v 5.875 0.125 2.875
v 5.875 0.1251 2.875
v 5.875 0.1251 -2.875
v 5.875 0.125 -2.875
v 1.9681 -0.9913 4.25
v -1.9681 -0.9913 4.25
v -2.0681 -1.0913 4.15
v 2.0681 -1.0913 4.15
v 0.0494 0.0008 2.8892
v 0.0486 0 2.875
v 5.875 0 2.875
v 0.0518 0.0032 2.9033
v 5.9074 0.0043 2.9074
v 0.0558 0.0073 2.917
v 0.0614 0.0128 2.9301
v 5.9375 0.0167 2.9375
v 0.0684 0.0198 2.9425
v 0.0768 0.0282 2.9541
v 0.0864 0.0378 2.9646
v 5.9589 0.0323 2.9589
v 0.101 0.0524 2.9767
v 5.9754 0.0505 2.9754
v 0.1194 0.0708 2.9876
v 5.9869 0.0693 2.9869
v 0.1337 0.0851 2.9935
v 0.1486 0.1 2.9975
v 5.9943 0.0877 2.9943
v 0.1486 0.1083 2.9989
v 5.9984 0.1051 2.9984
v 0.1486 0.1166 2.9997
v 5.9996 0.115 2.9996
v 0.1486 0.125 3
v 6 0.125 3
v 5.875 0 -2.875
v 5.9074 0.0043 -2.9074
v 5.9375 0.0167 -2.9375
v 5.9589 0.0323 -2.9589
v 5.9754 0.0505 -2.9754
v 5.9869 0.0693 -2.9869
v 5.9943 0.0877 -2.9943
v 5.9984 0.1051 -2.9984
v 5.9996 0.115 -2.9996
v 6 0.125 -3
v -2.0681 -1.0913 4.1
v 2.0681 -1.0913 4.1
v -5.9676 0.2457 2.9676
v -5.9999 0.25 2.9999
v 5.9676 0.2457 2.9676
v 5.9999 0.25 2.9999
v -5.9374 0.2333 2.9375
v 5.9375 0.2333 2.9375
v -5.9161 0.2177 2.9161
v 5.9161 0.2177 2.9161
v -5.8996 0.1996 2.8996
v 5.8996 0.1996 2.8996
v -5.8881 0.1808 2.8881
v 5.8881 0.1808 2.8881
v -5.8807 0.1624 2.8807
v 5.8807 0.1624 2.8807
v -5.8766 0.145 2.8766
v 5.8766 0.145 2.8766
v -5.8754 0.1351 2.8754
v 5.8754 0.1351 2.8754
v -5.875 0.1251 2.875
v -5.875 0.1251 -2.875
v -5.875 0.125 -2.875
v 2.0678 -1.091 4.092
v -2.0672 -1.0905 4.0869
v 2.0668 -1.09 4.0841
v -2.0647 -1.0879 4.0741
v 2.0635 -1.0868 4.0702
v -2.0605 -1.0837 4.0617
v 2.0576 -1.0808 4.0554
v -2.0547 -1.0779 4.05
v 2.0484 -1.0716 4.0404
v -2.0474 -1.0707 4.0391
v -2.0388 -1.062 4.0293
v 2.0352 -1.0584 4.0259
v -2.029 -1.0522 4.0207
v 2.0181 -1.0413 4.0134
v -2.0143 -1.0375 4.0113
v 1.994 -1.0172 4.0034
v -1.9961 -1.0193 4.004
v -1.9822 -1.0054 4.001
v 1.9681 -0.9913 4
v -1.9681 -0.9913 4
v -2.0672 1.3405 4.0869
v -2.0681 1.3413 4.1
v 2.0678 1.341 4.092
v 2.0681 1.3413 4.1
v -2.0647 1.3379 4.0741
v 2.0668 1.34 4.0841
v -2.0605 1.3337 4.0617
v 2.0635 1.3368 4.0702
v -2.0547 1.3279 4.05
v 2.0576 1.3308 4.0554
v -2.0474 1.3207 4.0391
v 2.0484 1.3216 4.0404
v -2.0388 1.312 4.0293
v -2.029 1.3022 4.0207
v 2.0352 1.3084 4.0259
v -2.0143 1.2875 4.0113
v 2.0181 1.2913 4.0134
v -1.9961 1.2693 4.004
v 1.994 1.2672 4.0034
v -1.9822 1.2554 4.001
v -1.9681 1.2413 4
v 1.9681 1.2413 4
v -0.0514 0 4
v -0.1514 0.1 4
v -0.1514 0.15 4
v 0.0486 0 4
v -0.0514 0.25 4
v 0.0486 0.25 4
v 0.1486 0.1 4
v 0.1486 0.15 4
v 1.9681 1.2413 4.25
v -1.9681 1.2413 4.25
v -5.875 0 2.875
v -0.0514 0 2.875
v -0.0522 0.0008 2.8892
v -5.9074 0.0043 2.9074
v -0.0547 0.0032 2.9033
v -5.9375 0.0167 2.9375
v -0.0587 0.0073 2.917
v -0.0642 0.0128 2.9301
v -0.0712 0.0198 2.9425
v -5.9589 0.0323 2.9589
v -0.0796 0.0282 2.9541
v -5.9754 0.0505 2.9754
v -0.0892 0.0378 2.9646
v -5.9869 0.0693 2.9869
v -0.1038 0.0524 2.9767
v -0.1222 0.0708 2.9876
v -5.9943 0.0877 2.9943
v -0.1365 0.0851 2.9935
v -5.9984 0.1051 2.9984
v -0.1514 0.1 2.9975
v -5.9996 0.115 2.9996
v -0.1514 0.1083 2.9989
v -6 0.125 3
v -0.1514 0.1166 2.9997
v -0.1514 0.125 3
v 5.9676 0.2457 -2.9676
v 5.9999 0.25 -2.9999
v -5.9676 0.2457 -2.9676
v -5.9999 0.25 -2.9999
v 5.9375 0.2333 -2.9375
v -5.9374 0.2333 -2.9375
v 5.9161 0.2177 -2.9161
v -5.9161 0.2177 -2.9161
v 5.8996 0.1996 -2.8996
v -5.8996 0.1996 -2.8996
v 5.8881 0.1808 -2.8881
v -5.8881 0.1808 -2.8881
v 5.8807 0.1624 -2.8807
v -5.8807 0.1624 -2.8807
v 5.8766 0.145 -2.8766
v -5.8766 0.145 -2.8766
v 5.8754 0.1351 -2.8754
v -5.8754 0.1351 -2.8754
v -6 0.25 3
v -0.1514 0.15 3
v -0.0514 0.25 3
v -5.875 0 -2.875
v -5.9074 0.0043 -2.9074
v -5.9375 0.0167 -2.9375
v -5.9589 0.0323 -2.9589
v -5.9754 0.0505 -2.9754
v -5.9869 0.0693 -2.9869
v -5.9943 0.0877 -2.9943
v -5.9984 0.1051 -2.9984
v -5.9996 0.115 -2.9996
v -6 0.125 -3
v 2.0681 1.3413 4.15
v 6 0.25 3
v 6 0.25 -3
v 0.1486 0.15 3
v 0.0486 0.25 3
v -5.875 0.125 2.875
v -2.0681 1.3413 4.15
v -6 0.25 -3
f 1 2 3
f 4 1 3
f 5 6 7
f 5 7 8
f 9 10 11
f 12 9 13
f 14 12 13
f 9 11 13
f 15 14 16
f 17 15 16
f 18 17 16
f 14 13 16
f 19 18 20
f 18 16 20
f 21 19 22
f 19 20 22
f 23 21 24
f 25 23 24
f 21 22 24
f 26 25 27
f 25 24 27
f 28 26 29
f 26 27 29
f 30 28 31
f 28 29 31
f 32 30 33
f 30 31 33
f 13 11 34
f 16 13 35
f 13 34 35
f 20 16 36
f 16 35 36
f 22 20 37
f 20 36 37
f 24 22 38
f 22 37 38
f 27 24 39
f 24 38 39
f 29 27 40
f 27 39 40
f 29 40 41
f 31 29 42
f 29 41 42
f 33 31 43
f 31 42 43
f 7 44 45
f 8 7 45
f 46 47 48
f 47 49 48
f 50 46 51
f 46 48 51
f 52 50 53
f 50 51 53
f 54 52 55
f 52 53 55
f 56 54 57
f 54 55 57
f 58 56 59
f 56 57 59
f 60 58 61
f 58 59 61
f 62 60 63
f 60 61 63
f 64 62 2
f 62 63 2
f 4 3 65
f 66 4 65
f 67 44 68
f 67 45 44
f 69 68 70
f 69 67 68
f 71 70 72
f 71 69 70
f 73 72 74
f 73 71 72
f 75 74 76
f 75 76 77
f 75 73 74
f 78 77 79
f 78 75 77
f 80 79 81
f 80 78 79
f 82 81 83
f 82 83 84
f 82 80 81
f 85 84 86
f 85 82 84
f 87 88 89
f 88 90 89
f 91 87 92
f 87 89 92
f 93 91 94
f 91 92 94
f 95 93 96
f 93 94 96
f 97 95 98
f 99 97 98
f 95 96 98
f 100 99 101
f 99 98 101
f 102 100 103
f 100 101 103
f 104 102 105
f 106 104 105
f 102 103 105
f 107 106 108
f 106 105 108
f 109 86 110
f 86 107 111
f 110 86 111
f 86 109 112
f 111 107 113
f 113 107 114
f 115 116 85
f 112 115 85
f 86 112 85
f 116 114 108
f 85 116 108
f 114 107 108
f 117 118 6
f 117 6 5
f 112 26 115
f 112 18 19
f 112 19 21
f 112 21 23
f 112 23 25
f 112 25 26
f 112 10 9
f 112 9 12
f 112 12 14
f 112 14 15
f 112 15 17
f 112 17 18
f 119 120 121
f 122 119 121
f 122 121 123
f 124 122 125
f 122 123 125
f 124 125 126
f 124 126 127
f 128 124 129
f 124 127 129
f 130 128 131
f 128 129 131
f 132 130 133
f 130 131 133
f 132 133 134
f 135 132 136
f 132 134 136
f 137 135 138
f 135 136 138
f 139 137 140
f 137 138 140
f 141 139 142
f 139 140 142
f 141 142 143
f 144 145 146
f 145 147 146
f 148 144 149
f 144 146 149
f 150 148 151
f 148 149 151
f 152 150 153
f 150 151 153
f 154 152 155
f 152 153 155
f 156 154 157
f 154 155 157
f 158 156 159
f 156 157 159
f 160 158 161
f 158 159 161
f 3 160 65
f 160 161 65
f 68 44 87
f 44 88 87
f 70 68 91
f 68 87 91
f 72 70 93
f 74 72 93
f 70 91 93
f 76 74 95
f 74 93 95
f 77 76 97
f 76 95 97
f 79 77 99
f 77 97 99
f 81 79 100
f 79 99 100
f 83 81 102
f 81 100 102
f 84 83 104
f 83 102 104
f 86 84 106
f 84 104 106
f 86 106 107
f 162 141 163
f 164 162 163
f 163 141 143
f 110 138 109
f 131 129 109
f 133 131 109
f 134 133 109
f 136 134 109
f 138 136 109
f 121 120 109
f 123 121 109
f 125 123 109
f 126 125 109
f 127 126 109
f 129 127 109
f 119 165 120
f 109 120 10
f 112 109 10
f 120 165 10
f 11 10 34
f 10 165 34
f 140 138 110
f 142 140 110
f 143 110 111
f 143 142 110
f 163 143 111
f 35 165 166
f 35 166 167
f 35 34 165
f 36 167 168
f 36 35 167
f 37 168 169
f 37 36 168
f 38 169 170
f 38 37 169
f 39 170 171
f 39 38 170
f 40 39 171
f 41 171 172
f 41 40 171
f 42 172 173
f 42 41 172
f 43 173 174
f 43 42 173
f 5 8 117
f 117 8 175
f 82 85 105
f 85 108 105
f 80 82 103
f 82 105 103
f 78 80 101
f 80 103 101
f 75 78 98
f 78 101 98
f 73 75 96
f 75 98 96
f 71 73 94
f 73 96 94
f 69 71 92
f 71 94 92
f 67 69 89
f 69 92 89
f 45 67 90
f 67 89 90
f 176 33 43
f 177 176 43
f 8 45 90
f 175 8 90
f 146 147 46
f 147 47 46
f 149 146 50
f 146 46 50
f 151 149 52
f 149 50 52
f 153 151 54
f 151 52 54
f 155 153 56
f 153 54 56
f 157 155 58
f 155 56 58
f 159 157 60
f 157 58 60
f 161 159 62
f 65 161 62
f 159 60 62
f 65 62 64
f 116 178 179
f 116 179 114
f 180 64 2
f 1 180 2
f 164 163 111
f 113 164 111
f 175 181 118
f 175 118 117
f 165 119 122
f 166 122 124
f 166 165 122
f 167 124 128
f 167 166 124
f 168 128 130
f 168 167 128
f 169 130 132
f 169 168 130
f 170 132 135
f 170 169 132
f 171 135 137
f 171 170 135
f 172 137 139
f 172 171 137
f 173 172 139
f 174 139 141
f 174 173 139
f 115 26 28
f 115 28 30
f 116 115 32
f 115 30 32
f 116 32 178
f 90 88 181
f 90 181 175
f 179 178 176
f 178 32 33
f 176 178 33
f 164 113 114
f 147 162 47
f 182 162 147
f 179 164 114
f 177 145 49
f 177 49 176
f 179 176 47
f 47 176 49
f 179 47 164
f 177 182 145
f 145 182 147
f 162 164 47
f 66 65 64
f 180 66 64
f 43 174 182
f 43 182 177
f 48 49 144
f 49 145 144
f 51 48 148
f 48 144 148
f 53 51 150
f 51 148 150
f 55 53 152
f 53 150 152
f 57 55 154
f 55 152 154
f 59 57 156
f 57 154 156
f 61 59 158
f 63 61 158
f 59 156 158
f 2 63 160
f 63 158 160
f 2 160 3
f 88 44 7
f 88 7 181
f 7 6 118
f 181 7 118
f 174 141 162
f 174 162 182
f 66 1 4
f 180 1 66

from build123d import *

# Parameters (mm, degrees)
SKETCH1_W           = 12
SKETCH1_H           = 6
BOSS_EXTRUDE1_DEPTH = 0.25
CUT_EXTRUDE1_DEPTH  = 0.125
SKETCH2_W           = 0.3
SKETCH2_H           = 0.25
BOSS_EXTRUDE2_DEPTH = 1
SKETCH4_W           = 4.136186254
SKETCH4_H           = 2.43263025
BOSS_EXTRUDE3_DEPTH = 0.25
FILLET2_R           = 0.1
CHAMFER1_SIZE       = 0.1
FILLET3_R           = 0.125
CHAMFER2_SIZE       = 0.1
FILLET4_R           = 0.125


with BuildPart() as part:
    # Sketch1 → Boss-Extrude1 (new body)
    with BuildSketch(Plane(origin=(0, 0, 0), x_dir=(1, 0, 0), z_dir=(0, 1, 0))):
        Rectangle(SKETCH1_W, SKETCH1_H)
    extrude(amount=BOSS_EXTRUDE1_DEPTH)

    # 3DSketch1 → Cut-Extrude1 (cut)
    with BuildSketch(Plane(origin=(-5.875, 0.25, -2.875), x_dir=(0.8982167220477767, 0, 0.43955286398082694), z_dir=(0, -1, 0))):
        Polygon((0, 0), (2.527428968, 5.164746152), (13.081475452, 0), (10.554046484, -5.164746152), align=None)
    extrude(amount=CUT_EXTRUDE1_DEPTH, mode=Mode.SUBTRACT)

    # Sketch2 → Boss-Extrude2 (add)
    with BuildSketch(Plane.XY.offset(3)):
        with Locations((-0.001421044, 0.125)):
            Rectangle(SKETCH2_W, SKETCH2_H)
    extrude(amount=BOSS_EXTRUDE2_DEPTH)

    # Sketch4 → Boss-Extrude3 (add)
    with BuildSketch(Plane.XY.offset(4)):
        with Locations((0, 0.125)):
            Rectangle(SKETCH4_W, SKETCH4_H)
    extrude(amount=BOSS_EXTRUDE3_DEPTH)

    # Fillet2
    fillet2_edges = [part.edges().sort_by_distance(p)[0] for p in [
        (2.068093127, 0.125, 4),
        (0, 1.341315125, 4),
        (-2.068093127, 0.125, 4),
        (0, -1.091315125, 4),
    ]]
    fillet(fillet2_edges, radius=FILLET2_R)

    # Chamfer1
    chamfer1_edges = [part.edges().sort_by_distance(p)[0] for p in [
        (2.068093127, 0.125, 4.25),
        (0, 1.341315125, 4.25),
        (-2.068093127, 0.125, 4.25),
        (0, -1.091315125, 4.25),
    ]]
    chamfer(chamfer1_edges, length=CHAMFER1_SIZE)

    # Fillet3
    fillet3_edges = [part.edges().sort_by_distance(p)[0] for p in [
        (0, 0.25, 2.875),
        (-5.875, 0.25, 0),
        (0, 0.25, -2.875),
        (5.875, 0.25, 0),
    ]]
    fillet(fillet3_edges, radius=FILLET3_R - 0.0001)  # a hair under: the kernel refuses the full size

    # Chamfer2
    chamfer2_edges = [part.edges().sort_by_distance(p)[0] for p in [
        (0.148578956, 0, 3.5),
        (0.148578956, 0.25, 3.5),
        (-0.151421044, 0.25, 3.5),
        (-0.151421044, 0, 3.5),
    ]]
    chamfer(chamfer2_edges, length=CHAMFER2_SIZE)

    # Fillet4
    fillet4_edges = [part.edges().sort_by_distance(p)[0] for p in [
        (6, 0, 0),
        (3.024289478, 0, 3),
        (-3.025710522, 0, 3),
        (-6, 0, 0),
        (0, 0, -3),
    ]]
    fillet(fillet4_edges, radius=FILLET4_R)


solid = part.part
